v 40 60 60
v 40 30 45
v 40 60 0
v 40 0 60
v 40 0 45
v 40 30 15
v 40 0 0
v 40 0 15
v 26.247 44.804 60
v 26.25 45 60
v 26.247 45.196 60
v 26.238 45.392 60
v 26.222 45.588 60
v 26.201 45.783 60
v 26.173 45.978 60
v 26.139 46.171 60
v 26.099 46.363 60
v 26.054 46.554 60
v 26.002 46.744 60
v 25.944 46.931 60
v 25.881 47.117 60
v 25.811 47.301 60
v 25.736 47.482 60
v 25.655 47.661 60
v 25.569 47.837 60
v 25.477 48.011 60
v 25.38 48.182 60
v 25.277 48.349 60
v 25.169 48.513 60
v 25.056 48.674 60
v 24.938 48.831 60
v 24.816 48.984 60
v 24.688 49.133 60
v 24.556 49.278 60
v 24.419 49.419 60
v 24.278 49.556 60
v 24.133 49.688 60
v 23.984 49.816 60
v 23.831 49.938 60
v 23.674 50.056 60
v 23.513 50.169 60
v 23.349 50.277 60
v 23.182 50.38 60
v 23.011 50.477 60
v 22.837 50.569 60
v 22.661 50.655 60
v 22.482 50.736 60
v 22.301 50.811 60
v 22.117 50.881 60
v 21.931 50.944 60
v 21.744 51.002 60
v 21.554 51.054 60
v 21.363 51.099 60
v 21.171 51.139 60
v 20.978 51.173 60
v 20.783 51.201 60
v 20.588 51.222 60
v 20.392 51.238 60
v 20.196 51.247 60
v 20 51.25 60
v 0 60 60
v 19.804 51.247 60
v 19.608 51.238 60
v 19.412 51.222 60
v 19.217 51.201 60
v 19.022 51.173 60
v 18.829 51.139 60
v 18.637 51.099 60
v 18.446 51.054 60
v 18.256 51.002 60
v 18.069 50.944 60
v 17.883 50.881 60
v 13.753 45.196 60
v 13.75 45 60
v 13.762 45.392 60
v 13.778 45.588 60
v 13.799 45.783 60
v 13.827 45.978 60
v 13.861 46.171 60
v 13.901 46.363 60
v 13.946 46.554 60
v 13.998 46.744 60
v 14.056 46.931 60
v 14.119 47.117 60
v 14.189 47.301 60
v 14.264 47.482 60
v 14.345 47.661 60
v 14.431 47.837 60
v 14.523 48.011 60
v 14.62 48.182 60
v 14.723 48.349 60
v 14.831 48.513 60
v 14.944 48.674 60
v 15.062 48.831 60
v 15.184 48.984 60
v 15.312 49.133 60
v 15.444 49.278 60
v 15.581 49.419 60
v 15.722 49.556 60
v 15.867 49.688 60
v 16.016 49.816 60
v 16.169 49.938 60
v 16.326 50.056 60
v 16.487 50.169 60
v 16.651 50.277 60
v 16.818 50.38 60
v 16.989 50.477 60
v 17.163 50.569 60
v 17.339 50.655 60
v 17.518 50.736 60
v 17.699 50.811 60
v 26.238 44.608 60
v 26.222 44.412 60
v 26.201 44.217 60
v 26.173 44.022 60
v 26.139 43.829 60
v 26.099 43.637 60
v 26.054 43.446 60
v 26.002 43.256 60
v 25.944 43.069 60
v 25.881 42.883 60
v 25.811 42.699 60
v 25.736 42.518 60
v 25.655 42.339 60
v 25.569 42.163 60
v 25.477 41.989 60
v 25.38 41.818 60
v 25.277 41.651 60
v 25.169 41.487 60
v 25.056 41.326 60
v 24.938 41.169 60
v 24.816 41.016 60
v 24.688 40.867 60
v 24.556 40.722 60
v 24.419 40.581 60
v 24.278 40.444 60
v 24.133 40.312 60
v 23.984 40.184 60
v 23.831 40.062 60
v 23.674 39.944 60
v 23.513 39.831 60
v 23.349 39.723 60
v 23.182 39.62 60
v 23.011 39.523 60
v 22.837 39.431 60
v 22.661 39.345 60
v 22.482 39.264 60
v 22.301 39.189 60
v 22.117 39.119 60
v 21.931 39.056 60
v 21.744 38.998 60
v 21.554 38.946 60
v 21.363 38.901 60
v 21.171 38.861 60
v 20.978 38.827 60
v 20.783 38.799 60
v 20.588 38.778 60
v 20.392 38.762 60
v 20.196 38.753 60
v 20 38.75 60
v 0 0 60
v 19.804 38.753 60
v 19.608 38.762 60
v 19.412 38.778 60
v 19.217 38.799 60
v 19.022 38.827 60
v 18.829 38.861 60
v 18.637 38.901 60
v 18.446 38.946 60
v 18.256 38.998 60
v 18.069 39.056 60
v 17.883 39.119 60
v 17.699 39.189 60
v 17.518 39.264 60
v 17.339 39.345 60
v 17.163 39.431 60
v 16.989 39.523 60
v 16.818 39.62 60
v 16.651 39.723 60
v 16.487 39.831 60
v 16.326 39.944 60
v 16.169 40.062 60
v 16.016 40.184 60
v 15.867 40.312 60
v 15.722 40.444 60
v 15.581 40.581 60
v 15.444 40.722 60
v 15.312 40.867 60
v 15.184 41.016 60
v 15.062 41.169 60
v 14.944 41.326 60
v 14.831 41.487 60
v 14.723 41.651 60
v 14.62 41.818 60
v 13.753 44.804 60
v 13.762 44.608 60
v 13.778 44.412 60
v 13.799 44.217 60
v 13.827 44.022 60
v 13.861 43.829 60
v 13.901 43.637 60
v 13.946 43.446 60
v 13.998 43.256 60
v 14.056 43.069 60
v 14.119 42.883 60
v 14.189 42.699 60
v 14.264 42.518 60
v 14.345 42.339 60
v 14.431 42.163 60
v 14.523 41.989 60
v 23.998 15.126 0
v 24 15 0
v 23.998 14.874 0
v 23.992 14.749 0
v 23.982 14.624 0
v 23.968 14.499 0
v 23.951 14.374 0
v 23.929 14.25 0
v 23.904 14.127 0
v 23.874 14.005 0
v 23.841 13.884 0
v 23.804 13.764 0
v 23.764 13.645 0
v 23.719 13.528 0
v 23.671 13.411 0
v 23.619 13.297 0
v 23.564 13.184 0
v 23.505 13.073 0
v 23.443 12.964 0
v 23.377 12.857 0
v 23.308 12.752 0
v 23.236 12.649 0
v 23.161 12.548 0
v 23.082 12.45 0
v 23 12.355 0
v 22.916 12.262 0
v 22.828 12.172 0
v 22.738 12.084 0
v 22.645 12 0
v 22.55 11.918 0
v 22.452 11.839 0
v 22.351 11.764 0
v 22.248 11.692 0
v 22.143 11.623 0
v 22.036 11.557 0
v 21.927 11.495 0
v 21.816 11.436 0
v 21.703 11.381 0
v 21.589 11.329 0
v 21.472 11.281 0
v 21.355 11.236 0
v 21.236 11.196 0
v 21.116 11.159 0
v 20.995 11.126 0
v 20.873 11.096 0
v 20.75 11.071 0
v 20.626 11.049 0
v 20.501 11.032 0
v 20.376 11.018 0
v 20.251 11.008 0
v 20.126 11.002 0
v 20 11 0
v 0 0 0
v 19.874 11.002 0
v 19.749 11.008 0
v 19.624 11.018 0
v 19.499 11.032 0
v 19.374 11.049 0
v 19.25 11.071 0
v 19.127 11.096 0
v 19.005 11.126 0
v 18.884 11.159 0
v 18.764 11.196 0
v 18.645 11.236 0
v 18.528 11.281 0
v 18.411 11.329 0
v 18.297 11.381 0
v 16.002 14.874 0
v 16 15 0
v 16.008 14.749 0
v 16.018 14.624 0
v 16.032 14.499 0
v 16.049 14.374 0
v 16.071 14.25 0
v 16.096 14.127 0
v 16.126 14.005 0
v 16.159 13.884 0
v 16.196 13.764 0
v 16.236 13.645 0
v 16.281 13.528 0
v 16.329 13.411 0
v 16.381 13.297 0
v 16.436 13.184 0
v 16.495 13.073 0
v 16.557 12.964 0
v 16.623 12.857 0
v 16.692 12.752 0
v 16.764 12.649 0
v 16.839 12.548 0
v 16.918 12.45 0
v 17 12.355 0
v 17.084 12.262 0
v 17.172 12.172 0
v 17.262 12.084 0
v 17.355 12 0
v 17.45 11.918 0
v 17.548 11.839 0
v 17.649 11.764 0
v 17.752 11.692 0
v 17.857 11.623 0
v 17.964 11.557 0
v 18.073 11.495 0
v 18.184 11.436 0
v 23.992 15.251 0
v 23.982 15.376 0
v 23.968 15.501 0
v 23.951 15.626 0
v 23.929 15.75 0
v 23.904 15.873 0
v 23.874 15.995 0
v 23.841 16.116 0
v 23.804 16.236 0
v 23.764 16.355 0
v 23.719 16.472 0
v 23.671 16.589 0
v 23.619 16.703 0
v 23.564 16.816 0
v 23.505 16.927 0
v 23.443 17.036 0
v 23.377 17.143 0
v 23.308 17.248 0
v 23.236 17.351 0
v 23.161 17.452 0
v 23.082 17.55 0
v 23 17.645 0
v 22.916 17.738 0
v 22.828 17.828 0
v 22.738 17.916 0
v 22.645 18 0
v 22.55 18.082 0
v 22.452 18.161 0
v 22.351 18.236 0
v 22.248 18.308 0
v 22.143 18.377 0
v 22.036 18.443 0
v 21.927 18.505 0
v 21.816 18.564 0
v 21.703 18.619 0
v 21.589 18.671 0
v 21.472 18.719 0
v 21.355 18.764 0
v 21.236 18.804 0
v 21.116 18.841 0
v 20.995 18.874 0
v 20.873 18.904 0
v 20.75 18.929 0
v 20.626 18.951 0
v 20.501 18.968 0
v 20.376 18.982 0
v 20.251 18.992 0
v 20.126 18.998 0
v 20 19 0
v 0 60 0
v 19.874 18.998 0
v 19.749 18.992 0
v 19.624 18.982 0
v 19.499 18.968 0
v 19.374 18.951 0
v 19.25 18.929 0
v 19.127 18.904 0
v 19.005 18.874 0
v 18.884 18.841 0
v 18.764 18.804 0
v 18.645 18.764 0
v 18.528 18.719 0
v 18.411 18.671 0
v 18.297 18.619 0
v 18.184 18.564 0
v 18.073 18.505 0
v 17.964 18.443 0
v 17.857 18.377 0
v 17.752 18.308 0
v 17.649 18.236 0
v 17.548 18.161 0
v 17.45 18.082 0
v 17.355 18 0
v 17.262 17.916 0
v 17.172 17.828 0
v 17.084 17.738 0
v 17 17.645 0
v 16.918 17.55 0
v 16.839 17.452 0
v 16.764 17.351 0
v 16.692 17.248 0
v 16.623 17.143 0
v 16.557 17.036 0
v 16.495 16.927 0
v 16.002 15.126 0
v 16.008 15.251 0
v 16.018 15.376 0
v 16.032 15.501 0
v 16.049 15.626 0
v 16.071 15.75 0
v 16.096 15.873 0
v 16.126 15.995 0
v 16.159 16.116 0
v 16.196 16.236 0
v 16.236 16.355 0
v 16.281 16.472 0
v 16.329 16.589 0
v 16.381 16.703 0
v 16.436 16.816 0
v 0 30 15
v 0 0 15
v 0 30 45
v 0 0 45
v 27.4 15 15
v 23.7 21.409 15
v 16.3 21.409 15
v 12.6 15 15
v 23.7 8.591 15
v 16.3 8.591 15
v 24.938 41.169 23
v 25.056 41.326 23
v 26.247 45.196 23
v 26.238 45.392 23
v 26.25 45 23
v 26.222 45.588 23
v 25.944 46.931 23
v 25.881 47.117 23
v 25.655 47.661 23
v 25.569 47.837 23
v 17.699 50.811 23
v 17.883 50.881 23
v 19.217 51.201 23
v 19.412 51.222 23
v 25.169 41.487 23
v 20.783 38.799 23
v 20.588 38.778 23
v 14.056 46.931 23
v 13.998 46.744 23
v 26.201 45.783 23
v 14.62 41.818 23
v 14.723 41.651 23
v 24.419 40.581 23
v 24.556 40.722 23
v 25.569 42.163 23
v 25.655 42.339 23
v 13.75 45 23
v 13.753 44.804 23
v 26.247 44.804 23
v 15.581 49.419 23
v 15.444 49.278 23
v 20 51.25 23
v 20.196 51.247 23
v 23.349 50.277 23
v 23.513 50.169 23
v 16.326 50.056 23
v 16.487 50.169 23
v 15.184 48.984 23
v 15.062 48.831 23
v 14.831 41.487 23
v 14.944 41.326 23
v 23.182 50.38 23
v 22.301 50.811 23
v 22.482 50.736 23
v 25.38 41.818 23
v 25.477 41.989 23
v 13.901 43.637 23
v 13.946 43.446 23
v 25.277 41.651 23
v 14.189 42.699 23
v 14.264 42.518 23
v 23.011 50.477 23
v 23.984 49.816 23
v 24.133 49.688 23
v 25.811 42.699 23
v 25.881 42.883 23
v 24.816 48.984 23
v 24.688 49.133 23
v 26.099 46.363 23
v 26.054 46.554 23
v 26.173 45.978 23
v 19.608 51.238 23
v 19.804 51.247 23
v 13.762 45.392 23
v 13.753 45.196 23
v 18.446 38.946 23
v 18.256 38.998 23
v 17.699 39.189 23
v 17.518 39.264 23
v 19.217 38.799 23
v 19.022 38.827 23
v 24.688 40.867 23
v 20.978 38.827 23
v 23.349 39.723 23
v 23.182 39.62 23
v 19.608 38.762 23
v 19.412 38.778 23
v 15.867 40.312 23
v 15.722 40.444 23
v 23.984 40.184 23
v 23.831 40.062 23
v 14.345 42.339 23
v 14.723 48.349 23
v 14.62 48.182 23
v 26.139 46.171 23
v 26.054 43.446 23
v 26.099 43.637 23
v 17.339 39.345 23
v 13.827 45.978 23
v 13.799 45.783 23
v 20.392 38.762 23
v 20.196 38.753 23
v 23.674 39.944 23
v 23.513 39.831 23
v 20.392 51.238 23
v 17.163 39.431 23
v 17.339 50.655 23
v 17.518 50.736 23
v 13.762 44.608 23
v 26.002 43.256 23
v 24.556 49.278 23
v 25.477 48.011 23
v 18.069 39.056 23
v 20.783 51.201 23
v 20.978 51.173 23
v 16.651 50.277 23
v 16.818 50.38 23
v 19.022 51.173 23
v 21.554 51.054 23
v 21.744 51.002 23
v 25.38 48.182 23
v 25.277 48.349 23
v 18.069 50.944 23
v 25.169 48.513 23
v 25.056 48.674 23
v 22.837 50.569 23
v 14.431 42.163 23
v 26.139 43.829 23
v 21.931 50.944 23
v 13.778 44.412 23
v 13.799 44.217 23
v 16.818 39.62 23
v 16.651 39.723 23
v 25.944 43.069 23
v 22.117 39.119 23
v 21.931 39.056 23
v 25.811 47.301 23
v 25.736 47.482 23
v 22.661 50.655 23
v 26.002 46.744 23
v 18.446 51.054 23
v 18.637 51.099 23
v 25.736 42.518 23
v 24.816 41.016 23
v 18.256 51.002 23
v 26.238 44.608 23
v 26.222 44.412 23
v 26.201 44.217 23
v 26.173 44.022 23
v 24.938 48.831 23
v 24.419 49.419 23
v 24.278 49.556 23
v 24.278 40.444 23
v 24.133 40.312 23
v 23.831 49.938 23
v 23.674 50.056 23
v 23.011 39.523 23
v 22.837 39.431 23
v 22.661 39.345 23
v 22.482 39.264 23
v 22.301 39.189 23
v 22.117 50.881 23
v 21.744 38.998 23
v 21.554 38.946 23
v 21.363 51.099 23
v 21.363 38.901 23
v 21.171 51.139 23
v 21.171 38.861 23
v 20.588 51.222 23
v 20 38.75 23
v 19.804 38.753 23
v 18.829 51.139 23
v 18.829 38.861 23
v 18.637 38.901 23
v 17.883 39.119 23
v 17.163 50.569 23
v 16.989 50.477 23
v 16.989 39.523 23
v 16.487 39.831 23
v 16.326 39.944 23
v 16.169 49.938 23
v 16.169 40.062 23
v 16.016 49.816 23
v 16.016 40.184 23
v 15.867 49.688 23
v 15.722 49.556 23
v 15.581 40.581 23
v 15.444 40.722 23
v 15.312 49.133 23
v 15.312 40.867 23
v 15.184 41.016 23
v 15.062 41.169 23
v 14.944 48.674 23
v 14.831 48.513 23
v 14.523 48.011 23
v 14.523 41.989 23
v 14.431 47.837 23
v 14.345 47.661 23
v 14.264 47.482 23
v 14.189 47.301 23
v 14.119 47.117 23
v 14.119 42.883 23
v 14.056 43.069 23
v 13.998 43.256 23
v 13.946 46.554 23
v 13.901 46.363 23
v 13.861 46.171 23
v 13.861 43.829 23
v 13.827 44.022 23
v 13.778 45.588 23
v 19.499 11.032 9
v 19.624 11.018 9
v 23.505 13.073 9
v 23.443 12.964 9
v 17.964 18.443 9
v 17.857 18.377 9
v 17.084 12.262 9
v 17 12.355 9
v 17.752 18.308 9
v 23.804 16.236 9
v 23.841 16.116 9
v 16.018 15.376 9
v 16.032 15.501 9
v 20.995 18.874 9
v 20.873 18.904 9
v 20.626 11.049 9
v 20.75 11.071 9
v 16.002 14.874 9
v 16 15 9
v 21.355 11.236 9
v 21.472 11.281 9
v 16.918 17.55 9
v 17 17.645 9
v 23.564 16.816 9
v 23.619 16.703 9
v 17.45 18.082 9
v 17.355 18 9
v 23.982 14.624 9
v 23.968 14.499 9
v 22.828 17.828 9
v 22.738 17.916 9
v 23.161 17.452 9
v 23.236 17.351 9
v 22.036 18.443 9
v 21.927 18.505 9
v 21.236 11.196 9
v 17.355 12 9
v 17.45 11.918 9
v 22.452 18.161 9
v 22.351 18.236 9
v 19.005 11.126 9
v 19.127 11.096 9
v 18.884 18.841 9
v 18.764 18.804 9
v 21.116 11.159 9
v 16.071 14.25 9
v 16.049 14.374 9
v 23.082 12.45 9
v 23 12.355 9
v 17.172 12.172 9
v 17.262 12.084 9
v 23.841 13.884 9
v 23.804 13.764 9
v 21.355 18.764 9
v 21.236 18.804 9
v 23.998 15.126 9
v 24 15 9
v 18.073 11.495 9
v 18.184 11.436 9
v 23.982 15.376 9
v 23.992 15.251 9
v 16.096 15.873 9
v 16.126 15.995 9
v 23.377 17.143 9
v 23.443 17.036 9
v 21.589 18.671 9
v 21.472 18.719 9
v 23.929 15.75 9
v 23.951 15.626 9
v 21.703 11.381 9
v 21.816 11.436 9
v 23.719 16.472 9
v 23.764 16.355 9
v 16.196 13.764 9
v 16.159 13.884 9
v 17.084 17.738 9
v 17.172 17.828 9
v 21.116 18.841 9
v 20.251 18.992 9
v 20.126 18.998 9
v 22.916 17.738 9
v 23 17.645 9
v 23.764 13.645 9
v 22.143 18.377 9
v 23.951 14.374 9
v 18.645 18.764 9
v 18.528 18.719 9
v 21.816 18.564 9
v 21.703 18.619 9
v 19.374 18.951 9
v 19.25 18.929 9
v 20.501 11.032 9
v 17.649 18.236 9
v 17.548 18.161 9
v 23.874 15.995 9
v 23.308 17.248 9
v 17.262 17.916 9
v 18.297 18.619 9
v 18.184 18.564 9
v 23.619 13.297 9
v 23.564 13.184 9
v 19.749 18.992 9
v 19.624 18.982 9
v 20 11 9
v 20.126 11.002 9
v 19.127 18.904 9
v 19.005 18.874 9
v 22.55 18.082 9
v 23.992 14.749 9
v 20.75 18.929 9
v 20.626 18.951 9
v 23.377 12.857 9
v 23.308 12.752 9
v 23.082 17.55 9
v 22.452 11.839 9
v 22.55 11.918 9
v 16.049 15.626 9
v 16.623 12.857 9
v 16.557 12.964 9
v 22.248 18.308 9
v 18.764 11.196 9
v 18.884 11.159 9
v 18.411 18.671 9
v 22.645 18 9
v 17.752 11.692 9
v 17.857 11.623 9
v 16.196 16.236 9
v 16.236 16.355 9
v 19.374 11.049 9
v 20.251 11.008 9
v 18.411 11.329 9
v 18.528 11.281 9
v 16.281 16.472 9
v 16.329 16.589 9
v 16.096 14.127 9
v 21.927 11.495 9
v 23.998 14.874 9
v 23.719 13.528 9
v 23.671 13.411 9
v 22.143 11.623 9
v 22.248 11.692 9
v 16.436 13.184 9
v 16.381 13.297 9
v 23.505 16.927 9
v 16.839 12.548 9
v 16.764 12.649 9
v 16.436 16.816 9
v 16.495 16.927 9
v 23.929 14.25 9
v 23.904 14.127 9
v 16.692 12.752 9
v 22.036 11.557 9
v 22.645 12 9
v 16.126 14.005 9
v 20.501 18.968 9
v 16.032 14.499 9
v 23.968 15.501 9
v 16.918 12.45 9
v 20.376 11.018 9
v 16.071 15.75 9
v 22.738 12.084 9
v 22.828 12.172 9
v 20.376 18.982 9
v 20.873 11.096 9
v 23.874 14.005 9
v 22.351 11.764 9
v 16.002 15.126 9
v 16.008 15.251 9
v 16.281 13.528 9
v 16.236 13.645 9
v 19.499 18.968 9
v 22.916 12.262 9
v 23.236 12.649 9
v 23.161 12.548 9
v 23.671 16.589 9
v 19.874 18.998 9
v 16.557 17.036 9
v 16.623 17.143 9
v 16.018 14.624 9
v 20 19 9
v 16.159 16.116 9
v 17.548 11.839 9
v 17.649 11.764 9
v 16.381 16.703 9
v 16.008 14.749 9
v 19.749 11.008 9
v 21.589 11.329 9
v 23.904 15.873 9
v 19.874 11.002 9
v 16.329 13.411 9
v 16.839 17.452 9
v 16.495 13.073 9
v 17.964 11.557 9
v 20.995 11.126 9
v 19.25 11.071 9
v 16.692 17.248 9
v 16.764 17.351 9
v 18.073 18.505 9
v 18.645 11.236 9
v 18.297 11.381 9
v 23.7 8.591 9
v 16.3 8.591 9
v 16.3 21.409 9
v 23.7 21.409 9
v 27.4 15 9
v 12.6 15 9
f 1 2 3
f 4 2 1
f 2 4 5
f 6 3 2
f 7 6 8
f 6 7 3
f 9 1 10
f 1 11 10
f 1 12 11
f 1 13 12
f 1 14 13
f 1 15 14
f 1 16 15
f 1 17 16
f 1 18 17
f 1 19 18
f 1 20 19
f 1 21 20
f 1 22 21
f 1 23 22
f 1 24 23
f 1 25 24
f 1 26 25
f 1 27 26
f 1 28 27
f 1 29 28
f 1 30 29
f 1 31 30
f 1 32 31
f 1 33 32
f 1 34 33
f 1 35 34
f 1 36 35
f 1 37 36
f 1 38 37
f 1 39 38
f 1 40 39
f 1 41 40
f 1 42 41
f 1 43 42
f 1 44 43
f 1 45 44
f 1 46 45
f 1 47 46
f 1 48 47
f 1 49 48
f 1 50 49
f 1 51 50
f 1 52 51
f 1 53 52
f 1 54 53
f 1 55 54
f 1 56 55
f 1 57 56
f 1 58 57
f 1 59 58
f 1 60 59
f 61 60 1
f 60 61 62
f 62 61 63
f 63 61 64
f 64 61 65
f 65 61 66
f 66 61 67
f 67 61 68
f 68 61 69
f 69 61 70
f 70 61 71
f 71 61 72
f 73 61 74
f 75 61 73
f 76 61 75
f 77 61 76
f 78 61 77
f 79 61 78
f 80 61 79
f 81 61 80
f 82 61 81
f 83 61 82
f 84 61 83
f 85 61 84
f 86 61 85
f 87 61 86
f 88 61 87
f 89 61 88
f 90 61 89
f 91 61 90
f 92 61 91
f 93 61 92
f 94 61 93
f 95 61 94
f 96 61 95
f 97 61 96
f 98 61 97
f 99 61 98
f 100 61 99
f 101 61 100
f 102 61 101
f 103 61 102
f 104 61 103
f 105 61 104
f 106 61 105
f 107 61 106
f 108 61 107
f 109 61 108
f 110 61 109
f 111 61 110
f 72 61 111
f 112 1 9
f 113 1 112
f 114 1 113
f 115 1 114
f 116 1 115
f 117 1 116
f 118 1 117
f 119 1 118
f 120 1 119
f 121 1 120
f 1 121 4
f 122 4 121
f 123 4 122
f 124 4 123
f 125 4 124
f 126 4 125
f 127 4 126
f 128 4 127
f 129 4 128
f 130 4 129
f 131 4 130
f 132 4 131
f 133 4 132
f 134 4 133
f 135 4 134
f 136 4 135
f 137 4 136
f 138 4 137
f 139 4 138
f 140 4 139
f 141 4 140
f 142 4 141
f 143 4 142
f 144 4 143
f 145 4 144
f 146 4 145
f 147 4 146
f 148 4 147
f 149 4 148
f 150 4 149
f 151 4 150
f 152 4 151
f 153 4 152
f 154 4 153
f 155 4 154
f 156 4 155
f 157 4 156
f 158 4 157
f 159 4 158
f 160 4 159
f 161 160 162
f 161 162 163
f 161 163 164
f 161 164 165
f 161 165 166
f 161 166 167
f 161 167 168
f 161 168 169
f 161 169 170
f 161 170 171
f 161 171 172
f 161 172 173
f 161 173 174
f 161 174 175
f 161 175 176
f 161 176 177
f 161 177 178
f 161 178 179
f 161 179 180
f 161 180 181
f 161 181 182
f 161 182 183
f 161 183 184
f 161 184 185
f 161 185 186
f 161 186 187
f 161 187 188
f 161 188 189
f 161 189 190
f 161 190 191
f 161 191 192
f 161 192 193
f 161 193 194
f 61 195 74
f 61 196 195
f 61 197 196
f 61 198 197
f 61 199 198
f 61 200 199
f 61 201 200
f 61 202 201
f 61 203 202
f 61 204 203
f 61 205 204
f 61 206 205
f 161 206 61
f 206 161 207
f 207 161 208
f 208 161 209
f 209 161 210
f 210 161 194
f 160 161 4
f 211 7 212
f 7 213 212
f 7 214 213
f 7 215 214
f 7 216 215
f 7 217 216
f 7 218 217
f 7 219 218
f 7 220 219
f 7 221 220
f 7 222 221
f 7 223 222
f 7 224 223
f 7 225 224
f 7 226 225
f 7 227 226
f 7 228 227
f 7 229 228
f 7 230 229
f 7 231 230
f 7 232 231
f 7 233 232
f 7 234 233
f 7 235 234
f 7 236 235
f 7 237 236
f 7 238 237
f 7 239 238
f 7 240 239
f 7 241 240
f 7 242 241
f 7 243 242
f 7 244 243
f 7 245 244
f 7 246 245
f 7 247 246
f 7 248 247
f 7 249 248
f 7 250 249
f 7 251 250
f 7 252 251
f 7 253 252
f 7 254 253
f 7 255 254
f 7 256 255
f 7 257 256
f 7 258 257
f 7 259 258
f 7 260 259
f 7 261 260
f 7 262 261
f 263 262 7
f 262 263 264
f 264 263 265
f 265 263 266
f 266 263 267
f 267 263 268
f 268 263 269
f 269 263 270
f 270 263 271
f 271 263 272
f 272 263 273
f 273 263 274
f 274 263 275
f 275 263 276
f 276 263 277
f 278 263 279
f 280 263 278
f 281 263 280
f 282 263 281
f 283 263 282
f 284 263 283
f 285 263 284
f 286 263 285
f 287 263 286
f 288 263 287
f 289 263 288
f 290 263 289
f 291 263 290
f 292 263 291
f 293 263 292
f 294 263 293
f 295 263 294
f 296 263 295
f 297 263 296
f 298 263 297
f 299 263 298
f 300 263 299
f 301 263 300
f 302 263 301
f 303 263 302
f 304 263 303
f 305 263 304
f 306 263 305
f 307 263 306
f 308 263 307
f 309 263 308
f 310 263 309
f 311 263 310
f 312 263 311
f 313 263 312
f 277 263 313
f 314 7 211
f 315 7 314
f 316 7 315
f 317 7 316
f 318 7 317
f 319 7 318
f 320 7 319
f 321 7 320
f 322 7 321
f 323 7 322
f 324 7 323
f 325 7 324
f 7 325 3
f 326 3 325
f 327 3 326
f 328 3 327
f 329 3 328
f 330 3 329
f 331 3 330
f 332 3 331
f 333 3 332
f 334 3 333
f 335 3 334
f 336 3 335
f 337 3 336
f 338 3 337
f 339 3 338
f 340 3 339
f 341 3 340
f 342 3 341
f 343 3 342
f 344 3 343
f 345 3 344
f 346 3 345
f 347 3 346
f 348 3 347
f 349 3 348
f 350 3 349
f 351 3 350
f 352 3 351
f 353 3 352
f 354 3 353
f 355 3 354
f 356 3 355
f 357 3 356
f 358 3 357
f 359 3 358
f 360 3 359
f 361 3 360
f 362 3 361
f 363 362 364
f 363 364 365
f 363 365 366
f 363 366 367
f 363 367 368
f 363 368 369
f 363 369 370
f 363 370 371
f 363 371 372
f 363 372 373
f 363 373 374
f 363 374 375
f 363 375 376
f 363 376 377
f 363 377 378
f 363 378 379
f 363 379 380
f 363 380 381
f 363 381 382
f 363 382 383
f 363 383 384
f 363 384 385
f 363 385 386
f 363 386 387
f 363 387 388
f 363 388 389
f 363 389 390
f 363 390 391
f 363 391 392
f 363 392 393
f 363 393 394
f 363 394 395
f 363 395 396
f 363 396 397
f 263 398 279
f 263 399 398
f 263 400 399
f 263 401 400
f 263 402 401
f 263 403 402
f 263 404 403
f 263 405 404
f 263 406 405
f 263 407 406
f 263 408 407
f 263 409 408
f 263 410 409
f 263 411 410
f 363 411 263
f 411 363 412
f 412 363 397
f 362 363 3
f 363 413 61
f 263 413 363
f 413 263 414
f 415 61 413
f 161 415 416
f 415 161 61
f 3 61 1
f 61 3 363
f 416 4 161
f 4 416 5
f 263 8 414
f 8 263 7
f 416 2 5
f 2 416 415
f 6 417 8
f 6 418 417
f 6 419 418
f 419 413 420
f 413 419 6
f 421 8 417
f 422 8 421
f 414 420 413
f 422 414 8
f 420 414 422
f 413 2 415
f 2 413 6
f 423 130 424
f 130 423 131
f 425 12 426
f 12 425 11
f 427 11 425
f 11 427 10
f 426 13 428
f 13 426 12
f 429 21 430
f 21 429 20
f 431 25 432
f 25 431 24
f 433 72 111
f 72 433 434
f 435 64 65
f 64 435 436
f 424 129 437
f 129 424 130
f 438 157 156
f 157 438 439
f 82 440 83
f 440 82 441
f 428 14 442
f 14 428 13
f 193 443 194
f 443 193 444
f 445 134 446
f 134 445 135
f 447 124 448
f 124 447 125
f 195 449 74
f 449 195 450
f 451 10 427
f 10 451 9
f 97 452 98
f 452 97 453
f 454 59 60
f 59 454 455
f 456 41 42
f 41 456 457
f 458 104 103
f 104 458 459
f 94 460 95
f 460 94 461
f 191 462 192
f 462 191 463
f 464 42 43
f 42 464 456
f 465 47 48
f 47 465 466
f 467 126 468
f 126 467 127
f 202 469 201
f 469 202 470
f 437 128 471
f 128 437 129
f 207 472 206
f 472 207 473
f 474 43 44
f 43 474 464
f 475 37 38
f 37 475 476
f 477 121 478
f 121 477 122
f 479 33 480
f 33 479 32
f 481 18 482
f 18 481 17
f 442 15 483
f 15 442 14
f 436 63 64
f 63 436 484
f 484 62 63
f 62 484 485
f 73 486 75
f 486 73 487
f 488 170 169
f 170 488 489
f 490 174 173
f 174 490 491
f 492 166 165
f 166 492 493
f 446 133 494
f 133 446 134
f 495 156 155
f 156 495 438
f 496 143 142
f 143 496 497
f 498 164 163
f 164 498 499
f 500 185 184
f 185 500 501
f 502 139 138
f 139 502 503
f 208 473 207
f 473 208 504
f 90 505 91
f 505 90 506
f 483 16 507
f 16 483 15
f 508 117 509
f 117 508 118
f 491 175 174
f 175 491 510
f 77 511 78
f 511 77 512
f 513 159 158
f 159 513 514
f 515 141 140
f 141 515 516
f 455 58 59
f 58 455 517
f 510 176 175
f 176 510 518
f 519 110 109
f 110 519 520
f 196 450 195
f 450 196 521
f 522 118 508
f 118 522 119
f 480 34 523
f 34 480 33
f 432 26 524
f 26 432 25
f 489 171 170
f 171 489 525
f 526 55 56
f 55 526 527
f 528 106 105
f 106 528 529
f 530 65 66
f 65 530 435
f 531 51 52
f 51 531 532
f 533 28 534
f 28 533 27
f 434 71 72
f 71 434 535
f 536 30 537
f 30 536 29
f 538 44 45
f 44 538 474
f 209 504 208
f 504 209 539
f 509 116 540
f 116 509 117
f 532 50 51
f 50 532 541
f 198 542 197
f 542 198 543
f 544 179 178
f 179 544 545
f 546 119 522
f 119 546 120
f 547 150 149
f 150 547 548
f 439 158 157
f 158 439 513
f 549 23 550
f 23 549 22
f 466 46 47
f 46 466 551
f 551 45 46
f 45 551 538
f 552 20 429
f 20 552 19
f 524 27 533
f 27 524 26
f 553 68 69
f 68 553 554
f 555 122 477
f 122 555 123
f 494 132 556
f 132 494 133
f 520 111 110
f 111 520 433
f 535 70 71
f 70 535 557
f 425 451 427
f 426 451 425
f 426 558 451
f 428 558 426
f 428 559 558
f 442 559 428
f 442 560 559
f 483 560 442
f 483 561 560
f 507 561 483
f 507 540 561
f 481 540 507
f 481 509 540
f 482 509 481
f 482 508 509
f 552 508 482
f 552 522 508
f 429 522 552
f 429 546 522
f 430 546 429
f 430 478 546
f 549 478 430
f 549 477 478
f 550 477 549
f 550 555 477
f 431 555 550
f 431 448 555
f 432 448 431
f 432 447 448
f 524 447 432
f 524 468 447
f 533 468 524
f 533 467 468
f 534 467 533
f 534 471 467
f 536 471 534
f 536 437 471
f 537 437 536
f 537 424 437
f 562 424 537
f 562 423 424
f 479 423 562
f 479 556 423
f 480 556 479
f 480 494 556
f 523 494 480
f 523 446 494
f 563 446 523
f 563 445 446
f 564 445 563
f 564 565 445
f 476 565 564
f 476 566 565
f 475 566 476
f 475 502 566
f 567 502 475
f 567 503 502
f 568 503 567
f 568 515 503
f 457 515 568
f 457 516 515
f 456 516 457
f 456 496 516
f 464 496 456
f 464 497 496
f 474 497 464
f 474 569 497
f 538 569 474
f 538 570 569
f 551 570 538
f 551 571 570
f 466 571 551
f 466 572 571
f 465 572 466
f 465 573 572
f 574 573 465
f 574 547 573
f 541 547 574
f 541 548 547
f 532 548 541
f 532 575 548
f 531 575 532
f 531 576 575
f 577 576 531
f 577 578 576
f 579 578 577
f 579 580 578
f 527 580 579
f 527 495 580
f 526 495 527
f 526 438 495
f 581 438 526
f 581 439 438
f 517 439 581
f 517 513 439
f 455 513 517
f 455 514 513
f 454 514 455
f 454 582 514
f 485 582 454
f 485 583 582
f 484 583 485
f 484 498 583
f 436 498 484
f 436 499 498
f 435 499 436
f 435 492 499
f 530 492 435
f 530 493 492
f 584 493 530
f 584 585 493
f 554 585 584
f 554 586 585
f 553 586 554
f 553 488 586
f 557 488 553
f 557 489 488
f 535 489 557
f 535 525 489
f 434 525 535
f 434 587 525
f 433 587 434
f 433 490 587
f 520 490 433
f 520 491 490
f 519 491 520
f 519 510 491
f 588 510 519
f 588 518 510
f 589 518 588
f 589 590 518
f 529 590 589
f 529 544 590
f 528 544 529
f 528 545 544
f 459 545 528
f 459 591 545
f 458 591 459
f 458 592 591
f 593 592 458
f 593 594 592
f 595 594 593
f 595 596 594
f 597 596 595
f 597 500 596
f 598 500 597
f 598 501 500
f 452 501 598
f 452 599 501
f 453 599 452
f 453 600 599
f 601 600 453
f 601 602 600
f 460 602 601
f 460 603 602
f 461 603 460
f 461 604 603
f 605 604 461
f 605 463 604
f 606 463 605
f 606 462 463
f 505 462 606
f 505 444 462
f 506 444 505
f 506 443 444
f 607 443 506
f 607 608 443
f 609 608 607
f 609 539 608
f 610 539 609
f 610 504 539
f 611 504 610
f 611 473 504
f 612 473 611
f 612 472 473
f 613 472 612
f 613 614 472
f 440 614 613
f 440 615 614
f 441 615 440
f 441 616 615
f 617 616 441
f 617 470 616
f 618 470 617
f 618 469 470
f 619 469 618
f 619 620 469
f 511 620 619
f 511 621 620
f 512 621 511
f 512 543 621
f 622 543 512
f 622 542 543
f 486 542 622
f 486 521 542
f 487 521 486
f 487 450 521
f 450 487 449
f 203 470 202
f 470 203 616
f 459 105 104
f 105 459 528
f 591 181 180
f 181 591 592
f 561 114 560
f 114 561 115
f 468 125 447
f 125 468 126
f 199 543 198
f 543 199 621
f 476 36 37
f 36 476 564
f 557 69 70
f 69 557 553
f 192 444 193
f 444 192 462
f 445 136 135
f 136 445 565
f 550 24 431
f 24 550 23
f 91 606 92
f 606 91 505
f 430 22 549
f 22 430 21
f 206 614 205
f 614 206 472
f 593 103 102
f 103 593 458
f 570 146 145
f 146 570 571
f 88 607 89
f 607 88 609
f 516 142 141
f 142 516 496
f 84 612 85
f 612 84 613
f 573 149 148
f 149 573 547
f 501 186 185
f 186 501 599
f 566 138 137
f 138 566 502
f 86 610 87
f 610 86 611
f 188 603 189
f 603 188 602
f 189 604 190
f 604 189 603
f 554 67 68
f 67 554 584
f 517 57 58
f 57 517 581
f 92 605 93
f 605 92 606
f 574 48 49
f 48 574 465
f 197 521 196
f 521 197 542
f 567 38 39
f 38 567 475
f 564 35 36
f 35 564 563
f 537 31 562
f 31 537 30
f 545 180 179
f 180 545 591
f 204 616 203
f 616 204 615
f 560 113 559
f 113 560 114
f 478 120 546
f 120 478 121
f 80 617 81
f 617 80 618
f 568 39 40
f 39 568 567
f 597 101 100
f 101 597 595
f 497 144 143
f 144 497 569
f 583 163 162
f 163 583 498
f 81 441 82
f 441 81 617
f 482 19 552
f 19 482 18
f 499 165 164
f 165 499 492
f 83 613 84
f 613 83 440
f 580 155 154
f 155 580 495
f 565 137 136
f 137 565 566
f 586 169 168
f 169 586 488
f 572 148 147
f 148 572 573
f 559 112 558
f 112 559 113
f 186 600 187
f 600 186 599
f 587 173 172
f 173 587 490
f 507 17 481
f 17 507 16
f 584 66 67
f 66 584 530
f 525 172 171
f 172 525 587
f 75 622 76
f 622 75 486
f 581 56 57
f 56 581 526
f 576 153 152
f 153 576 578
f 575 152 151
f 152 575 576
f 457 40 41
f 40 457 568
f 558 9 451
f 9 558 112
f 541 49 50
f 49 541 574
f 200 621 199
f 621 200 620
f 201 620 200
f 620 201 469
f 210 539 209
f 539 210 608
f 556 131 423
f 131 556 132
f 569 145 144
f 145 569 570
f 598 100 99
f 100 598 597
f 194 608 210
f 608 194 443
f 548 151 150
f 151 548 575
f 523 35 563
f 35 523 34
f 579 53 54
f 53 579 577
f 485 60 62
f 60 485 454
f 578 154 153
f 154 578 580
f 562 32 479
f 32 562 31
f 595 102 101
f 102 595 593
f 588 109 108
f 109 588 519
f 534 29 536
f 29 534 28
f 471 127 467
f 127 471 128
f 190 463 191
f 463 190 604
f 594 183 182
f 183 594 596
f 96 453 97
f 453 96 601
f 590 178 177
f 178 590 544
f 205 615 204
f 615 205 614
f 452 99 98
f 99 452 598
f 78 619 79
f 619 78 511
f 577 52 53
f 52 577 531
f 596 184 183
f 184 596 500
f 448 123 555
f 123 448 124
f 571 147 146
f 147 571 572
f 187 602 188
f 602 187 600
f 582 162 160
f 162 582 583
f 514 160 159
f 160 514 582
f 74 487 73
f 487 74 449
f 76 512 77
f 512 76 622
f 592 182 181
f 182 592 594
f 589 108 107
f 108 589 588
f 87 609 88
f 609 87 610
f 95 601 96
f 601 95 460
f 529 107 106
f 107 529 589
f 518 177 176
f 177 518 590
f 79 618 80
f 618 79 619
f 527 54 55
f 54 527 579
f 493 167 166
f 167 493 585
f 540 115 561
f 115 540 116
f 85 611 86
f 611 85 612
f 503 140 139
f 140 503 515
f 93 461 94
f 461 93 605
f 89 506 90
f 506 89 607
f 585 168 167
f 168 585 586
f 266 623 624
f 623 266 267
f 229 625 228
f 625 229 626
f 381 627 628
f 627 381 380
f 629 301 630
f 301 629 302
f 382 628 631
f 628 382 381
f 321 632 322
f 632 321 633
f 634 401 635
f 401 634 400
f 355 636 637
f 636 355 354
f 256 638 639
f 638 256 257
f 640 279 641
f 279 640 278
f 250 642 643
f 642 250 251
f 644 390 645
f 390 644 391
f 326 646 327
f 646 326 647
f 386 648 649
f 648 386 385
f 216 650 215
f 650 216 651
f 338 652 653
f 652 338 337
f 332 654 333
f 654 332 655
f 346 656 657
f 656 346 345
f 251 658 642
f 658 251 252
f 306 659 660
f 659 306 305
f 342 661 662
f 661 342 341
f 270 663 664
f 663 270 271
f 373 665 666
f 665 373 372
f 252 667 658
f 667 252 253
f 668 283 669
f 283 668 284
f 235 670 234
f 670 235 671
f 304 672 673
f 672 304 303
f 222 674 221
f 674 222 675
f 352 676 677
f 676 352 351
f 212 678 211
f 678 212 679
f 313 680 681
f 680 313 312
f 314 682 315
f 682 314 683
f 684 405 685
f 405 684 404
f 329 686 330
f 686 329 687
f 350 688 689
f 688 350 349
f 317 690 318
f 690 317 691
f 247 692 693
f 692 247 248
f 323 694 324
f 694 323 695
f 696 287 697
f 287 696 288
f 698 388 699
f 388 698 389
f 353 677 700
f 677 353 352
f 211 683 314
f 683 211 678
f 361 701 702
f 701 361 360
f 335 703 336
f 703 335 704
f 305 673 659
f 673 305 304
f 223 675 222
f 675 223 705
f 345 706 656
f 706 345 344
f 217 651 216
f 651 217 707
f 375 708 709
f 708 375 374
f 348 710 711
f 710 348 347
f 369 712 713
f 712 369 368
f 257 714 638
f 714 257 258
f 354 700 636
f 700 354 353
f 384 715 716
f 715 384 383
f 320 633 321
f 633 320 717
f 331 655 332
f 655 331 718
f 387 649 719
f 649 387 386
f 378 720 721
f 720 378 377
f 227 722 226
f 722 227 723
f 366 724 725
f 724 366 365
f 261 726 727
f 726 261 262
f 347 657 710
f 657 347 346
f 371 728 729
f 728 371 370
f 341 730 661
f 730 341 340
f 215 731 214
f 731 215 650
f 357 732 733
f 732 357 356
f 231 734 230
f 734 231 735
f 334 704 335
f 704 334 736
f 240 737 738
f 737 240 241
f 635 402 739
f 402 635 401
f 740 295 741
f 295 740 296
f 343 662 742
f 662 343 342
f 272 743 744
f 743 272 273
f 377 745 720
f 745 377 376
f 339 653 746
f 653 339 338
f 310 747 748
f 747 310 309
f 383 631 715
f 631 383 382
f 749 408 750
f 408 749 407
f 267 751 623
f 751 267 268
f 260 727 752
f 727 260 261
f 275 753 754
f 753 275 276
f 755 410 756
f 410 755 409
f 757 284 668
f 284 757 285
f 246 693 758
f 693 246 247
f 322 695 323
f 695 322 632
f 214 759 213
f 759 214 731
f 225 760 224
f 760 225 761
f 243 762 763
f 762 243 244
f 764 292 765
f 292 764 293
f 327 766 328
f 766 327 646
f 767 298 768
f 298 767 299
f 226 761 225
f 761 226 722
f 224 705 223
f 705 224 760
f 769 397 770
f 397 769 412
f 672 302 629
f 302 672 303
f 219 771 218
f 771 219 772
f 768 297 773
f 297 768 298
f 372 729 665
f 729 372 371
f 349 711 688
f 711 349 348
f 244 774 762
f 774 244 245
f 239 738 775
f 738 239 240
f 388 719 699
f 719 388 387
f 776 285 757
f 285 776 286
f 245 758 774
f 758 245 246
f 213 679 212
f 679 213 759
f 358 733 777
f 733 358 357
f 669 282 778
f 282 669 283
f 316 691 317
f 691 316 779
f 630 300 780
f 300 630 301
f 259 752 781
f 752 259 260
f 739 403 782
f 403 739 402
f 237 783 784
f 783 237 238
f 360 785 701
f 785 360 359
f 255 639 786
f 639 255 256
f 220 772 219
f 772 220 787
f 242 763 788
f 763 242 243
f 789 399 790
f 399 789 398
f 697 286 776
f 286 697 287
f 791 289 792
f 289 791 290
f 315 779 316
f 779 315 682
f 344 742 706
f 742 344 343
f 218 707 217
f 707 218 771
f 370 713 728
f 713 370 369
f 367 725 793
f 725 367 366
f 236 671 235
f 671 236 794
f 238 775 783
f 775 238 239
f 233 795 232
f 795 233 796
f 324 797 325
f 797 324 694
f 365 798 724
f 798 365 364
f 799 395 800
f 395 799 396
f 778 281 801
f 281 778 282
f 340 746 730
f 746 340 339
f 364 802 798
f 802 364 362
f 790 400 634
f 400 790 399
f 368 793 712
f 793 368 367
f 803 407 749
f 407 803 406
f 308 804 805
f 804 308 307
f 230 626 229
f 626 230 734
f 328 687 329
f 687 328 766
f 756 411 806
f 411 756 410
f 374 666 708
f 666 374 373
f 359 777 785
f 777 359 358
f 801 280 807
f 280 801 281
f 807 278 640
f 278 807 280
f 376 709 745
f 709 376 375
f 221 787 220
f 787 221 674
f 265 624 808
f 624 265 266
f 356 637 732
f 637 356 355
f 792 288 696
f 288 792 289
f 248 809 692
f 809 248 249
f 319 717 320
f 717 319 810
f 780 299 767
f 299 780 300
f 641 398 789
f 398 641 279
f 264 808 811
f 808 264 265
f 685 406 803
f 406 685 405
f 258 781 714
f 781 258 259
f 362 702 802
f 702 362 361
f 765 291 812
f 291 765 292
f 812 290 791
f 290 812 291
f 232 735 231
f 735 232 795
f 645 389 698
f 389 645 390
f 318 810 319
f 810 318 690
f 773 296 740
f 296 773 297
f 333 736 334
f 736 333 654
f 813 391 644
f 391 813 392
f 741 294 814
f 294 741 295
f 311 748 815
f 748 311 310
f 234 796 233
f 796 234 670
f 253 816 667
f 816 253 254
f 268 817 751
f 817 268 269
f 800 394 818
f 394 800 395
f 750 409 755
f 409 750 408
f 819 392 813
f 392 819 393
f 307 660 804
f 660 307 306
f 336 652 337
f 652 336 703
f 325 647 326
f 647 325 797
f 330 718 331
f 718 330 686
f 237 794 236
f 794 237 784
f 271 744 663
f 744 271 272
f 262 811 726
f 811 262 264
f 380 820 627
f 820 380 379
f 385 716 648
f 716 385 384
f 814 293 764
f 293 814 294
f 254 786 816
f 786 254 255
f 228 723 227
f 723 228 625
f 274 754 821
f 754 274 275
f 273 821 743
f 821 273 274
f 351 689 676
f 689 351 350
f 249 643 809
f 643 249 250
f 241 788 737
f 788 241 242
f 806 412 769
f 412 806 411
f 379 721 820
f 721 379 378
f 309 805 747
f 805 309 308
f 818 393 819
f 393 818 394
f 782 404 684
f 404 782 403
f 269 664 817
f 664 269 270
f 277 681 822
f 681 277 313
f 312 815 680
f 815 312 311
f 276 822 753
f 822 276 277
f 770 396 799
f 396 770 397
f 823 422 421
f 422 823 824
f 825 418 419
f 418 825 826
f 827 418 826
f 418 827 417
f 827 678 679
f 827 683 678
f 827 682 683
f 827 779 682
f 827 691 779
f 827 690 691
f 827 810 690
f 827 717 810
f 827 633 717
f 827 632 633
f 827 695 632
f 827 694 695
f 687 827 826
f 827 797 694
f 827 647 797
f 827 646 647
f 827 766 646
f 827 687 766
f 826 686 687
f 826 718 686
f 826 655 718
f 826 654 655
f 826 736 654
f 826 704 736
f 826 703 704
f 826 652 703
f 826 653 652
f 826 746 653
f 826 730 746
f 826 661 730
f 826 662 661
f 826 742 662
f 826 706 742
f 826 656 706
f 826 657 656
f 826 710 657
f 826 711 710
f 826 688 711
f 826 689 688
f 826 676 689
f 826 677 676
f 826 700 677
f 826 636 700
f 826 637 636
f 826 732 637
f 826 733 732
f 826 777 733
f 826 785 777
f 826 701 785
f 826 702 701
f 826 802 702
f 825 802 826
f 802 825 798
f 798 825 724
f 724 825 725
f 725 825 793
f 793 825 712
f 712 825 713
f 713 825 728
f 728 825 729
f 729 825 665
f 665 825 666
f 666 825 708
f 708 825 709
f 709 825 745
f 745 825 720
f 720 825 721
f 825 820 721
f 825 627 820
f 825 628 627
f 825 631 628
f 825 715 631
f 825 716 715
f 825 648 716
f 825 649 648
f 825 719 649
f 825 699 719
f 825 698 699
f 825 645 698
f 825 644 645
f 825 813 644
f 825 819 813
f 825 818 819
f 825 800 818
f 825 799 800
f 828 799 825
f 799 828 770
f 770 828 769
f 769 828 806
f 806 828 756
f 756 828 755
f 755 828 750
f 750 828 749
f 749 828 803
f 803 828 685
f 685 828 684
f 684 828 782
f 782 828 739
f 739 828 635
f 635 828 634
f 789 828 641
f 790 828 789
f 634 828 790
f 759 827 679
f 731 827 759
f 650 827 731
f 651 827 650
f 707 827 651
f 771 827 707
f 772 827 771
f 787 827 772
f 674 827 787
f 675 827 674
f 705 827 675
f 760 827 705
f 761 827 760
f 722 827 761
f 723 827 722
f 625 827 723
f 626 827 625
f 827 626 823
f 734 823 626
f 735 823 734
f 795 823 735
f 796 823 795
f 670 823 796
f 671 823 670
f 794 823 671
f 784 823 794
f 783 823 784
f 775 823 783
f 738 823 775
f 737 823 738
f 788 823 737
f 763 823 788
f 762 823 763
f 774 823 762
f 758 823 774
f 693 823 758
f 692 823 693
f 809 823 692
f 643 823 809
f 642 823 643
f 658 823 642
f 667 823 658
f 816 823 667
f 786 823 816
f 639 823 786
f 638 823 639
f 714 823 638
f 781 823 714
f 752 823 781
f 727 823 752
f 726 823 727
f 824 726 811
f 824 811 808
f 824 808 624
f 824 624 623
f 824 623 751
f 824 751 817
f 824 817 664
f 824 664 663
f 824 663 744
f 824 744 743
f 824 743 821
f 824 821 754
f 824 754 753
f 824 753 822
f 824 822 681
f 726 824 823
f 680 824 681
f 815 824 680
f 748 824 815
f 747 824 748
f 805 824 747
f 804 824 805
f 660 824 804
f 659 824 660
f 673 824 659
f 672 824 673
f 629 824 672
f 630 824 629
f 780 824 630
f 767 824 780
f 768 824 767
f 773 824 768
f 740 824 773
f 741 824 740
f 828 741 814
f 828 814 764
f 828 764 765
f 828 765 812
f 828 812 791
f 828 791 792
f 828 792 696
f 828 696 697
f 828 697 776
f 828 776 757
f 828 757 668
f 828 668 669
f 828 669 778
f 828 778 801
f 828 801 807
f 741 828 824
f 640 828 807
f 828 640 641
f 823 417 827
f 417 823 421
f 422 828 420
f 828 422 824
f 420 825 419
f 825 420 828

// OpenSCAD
rotate(a=[0,0,0]) {
////BODY////
    
difference() {
    cube([40,60,60]);
    translate([0,0,15])
    cube([40,30,30]);

////Top HOLE 12.5 MM////

    translate([20,45,23])
    cylinder(r=6.25,h=37,$fn=200);

////NUT & BOLT HOLE////

    translate([20,15,0])
    cylinder(r=4,h=15,$fn=200);
  
    translate([20,15,9])
    cylinder(r=7.4,h=6.1,$fn=6);
        
        
}
}
